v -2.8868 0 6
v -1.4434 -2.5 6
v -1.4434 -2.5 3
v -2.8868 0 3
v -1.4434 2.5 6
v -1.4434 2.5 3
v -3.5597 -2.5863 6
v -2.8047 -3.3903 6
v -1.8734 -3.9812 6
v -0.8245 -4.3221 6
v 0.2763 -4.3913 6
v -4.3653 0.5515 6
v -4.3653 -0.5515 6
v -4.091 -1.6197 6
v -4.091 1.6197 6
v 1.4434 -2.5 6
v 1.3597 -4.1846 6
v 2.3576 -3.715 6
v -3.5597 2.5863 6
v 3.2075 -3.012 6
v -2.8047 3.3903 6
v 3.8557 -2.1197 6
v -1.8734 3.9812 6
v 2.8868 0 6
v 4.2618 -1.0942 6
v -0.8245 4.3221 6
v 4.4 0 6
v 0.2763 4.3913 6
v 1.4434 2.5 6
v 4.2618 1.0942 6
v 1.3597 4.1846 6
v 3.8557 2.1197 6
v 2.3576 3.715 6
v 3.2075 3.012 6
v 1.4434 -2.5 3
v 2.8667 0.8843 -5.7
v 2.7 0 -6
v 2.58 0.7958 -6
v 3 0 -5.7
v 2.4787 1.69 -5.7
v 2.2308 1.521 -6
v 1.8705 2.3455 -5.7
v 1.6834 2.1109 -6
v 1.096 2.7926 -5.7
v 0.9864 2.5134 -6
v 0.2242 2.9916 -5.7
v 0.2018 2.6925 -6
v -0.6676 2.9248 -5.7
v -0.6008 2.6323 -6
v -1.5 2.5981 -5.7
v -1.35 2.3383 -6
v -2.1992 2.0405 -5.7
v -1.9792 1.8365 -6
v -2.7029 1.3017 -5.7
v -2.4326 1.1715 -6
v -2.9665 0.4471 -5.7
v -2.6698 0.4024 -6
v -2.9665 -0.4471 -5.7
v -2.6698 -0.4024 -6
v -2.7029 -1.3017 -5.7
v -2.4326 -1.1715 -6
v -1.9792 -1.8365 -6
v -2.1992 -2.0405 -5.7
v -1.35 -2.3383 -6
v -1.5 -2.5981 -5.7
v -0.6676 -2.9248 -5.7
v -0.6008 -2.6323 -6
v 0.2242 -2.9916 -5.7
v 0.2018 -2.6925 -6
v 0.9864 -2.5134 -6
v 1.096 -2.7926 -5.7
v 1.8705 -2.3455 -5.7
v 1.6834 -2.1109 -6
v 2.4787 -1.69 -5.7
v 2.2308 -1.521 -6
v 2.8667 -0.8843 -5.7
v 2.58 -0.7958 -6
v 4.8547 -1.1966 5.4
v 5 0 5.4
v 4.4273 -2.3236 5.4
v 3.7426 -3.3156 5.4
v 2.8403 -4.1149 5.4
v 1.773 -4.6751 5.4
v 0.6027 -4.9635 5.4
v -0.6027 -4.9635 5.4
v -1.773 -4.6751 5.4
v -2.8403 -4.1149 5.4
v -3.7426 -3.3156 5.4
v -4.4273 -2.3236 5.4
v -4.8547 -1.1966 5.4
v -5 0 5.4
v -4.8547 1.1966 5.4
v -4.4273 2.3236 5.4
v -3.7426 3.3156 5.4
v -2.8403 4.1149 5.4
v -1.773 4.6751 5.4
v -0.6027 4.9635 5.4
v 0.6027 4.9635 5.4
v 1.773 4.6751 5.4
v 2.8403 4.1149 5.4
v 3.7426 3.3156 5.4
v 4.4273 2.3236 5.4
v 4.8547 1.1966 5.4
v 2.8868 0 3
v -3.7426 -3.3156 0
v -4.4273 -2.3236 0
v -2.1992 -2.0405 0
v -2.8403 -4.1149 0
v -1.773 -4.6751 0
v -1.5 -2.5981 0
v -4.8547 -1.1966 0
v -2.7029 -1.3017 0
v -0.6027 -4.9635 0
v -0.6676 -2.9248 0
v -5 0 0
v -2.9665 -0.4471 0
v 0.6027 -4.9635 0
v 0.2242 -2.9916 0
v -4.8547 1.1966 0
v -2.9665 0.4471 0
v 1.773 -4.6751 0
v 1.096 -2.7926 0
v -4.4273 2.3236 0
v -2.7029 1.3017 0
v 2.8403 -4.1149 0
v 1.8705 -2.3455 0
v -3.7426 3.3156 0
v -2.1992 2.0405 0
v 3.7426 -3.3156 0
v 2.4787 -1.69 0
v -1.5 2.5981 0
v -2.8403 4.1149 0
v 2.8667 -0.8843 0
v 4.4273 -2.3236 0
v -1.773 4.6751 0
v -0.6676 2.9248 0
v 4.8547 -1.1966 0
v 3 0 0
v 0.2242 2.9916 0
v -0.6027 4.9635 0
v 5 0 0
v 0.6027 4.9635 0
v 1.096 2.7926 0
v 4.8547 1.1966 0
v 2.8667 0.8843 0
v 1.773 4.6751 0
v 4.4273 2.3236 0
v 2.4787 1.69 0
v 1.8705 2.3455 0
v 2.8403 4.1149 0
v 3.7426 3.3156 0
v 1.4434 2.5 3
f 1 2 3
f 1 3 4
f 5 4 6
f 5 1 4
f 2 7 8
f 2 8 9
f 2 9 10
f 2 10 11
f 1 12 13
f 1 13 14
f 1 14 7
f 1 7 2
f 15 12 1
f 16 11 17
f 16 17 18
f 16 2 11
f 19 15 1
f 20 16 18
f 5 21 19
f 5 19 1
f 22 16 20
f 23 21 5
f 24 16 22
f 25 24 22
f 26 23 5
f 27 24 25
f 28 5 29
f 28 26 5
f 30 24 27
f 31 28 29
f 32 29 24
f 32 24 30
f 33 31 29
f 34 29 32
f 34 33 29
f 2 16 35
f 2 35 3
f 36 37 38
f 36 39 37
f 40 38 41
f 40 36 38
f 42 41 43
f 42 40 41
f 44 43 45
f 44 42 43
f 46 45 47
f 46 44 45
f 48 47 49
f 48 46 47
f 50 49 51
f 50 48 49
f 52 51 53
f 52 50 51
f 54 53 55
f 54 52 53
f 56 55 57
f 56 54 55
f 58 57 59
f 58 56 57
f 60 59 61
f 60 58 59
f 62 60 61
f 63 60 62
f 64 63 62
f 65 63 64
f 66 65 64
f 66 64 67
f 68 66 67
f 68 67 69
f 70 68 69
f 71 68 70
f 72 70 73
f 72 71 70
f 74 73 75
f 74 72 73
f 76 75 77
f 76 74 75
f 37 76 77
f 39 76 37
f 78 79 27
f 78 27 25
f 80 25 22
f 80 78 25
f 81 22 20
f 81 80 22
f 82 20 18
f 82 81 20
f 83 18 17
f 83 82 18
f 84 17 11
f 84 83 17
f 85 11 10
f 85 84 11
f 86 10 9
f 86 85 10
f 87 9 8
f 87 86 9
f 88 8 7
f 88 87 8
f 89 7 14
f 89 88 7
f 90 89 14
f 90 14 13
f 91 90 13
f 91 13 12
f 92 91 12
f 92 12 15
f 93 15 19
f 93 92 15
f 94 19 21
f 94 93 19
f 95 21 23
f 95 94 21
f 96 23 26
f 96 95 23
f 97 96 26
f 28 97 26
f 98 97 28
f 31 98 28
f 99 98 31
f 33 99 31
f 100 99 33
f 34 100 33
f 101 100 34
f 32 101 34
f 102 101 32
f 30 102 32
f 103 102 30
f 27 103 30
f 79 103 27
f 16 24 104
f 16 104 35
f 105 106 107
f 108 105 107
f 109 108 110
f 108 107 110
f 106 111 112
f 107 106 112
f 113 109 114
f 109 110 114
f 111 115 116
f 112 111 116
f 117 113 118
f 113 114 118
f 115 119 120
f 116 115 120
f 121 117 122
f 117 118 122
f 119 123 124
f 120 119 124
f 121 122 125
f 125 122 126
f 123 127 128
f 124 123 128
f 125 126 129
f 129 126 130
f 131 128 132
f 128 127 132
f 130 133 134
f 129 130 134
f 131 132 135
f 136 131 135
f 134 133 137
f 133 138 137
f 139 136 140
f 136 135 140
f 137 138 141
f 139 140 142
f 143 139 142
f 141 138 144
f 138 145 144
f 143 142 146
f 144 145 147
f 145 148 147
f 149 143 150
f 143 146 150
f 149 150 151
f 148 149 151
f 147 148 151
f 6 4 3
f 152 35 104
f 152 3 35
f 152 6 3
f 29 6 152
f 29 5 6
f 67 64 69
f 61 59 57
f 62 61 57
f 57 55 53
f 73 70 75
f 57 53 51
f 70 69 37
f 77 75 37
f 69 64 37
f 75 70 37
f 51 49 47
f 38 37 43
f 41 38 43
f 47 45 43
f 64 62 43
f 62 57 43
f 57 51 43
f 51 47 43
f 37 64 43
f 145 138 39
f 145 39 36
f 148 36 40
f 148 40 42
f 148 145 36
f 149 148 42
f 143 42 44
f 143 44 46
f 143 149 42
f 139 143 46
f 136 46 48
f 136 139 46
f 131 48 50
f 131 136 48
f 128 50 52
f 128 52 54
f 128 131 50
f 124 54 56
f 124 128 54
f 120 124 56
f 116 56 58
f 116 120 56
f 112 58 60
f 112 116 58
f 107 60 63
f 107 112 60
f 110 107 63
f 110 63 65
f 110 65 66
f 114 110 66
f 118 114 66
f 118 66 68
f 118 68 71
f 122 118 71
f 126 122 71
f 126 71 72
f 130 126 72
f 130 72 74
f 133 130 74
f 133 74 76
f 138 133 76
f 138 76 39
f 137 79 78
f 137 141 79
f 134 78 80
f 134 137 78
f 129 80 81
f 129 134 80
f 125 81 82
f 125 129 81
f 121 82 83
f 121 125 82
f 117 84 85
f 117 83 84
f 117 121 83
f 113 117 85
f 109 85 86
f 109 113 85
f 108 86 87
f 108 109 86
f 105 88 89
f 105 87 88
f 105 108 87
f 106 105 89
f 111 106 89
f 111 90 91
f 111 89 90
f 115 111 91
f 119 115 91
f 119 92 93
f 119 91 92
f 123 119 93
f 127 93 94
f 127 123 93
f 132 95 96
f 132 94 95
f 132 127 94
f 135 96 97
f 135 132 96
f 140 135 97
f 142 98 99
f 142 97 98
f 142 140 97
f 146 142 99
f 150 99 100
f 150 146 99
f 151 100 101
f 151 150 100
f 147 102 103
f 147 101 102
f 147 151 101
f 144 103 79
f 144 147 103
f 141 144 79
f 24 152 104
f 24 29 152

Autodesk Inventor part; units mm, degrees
ref_plane "YZ Plane" through (0, 0, 0) normal (1, 0, 0) x (0, 1, 0)
ref_plane "XZ Plane" through (0, 0, 0) normal (0, 1, 0) x (-1, 0, 0)
ref_plane "XY Plane" through (0, 0, 0) normal (0, 0, 1) x (1, 0, 0)
sketch "Sketch3" plane through (0, 0, 0) normal (0, 0, 1) x (1, 0, 0)
  circle A0 centre (0, 0) radius 3
  dimension "Diameter" = 6
extrude "Extrusion1" add sketch "Sketch3" against normal blind 6
sketch "Sketch4" plane through (0, 0, 0) normal (0, 0, 1) x (1, 0, 0)
  circle A0 centre (0, 0) radius 3 projected
  circle A1 centre (0, 0) radius 5
  dimension "Head_Diameter" = 10
extrude "Extrusion2" add sketch "Sketch4" along normal blind 6 contours A0 | A1
sketch "Sketch5" plane through (0, 0, 6) normal (0, 0, 1) x (1, 0, 0)
  circle A0 centre (0, 0) radius 5 projected
  line L0 (2.8868, 0) -> (1.4434, -2.5)
  line L1 (1.4434, -2.5) -> (-1.4434, -2.5)
  line L2 (-1.4434, -2.5) -> (-2.8868, 0)
  line L3 (-2.8868, 0) -> (-1.4434, 2.5)
  line L4 (-1.4434, 2.5) -> (1.4434, 2.5)
  line L5 (1.4434, 2.5) -> (2.8868, 0)
  line L6 (0, 0) -> (2.8868, 0) construction
  dimension "Hex_Width" = 5
extrude "Extrusion3" cut sketch "Sketch5" against normal blind 3 contours L0 L1 L2 L3 L4 L5
thread "Thread1" size "M6x1" class "4g6g" standard "ANSI Metric M Profile" length 6
chamfer "Chamfer1" distance 0.6 angle 45 1 edges at (-5, 0, 6)
chamfer "Chamfer2" distance 0.3 angle 45 1 edges at (-3, 0, -6)
equation "\"d14\" = 0.5 * Chamfer"
equation "\"Chamfer\" = 0.6"
properties part number "SCREW, SOCKET HD, P, 12.9, M6X1" material "Steel, MS"
